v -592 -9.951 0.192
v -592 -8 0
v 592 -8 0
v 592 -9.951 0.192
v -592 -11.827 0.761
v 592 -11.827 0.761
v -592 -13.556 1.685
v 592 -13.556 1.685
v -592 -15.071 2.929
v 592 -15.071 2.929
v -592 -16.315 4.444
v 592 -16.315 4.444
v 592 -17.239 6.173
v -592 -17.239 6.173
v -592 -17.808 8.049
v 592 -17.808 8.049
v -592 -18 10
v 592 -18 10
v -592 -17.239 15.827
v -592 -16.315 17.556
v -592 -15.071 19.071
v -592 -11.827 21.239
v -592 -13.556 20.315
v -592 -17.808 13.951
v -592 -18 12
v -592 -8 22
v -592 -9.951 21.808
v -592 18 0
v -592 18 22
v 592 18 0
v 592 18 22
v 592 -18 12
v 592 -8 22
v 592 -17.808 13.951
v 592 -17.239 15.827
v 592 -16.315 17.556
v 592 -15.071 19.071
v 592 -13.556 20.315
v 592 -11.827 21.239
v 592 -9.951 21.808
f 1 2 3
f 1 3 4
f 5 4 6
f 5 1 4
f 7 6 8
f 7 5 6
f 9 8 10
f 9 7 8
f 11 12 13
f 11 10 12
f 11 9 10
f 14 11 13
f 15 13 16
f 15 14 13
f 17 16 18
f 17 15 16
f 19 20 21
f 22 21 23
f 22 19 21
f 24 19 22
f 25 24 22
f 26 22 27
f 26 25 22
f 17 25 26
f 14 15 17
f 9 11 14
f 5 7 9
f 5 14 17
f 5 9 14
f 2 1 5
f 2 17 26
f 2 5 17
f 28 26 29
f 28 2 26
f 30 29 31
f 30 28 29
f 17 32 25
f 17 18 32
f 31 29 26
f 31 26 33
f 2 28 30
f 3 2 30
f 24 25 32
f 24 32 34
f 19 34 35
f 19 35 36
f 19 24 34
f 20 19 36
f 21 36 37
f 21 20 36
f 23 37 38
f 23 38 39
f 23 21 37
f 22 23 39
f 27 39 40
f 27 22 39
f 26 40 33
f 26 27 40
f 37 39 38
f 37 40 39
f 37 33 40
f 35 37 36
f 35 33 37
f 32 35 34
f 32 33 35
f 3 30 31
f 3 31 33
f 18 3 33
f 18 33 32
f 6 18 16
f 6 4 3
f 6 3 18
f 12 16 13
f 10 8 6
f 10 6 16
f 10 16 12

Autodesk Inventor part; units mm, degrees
ref_plane "YZ Plane" through (0, 0, 0) normal (1, 0, 0) x (0, 1, 0)
ref_plane "XZ Plane" through (0, 0, 0) normal (0, 1, 0) x (-1, 0, 0)
ref_plane "XY Plane" through (0, 0, 0) normal (0, 0, 1) x (1, 0, 0)
sketch "Sketch1" plane through (0, 0, 0) normal (0, 0, 1) x (1, 0, 0)
  line L0 (-592, 18) -> (592, 18)
  line L1 (592, 18) -> (592, -18)
  line L2 (592, -18) -> (-592, -18)
  line L3 (-592, -18) -> (-592, 18)
  line L4 (-592, 18) -> (592, -18) construction
  line L5 (592, 18) -> (-592, -18) construction
  point P0 (0, 0)
  dimension "d0" = 36
  dimension "d1" = 1184
extrude "Extrusion1" add sketch "Sketch1" along normal blind 22
fillet "Fillet1" radius 10 1 edges at (0, -18, 22)
fillet "Fillet2" radius 10 1 edges at (0, -18, 0)
properties part number "Light tube 118.4cm"
